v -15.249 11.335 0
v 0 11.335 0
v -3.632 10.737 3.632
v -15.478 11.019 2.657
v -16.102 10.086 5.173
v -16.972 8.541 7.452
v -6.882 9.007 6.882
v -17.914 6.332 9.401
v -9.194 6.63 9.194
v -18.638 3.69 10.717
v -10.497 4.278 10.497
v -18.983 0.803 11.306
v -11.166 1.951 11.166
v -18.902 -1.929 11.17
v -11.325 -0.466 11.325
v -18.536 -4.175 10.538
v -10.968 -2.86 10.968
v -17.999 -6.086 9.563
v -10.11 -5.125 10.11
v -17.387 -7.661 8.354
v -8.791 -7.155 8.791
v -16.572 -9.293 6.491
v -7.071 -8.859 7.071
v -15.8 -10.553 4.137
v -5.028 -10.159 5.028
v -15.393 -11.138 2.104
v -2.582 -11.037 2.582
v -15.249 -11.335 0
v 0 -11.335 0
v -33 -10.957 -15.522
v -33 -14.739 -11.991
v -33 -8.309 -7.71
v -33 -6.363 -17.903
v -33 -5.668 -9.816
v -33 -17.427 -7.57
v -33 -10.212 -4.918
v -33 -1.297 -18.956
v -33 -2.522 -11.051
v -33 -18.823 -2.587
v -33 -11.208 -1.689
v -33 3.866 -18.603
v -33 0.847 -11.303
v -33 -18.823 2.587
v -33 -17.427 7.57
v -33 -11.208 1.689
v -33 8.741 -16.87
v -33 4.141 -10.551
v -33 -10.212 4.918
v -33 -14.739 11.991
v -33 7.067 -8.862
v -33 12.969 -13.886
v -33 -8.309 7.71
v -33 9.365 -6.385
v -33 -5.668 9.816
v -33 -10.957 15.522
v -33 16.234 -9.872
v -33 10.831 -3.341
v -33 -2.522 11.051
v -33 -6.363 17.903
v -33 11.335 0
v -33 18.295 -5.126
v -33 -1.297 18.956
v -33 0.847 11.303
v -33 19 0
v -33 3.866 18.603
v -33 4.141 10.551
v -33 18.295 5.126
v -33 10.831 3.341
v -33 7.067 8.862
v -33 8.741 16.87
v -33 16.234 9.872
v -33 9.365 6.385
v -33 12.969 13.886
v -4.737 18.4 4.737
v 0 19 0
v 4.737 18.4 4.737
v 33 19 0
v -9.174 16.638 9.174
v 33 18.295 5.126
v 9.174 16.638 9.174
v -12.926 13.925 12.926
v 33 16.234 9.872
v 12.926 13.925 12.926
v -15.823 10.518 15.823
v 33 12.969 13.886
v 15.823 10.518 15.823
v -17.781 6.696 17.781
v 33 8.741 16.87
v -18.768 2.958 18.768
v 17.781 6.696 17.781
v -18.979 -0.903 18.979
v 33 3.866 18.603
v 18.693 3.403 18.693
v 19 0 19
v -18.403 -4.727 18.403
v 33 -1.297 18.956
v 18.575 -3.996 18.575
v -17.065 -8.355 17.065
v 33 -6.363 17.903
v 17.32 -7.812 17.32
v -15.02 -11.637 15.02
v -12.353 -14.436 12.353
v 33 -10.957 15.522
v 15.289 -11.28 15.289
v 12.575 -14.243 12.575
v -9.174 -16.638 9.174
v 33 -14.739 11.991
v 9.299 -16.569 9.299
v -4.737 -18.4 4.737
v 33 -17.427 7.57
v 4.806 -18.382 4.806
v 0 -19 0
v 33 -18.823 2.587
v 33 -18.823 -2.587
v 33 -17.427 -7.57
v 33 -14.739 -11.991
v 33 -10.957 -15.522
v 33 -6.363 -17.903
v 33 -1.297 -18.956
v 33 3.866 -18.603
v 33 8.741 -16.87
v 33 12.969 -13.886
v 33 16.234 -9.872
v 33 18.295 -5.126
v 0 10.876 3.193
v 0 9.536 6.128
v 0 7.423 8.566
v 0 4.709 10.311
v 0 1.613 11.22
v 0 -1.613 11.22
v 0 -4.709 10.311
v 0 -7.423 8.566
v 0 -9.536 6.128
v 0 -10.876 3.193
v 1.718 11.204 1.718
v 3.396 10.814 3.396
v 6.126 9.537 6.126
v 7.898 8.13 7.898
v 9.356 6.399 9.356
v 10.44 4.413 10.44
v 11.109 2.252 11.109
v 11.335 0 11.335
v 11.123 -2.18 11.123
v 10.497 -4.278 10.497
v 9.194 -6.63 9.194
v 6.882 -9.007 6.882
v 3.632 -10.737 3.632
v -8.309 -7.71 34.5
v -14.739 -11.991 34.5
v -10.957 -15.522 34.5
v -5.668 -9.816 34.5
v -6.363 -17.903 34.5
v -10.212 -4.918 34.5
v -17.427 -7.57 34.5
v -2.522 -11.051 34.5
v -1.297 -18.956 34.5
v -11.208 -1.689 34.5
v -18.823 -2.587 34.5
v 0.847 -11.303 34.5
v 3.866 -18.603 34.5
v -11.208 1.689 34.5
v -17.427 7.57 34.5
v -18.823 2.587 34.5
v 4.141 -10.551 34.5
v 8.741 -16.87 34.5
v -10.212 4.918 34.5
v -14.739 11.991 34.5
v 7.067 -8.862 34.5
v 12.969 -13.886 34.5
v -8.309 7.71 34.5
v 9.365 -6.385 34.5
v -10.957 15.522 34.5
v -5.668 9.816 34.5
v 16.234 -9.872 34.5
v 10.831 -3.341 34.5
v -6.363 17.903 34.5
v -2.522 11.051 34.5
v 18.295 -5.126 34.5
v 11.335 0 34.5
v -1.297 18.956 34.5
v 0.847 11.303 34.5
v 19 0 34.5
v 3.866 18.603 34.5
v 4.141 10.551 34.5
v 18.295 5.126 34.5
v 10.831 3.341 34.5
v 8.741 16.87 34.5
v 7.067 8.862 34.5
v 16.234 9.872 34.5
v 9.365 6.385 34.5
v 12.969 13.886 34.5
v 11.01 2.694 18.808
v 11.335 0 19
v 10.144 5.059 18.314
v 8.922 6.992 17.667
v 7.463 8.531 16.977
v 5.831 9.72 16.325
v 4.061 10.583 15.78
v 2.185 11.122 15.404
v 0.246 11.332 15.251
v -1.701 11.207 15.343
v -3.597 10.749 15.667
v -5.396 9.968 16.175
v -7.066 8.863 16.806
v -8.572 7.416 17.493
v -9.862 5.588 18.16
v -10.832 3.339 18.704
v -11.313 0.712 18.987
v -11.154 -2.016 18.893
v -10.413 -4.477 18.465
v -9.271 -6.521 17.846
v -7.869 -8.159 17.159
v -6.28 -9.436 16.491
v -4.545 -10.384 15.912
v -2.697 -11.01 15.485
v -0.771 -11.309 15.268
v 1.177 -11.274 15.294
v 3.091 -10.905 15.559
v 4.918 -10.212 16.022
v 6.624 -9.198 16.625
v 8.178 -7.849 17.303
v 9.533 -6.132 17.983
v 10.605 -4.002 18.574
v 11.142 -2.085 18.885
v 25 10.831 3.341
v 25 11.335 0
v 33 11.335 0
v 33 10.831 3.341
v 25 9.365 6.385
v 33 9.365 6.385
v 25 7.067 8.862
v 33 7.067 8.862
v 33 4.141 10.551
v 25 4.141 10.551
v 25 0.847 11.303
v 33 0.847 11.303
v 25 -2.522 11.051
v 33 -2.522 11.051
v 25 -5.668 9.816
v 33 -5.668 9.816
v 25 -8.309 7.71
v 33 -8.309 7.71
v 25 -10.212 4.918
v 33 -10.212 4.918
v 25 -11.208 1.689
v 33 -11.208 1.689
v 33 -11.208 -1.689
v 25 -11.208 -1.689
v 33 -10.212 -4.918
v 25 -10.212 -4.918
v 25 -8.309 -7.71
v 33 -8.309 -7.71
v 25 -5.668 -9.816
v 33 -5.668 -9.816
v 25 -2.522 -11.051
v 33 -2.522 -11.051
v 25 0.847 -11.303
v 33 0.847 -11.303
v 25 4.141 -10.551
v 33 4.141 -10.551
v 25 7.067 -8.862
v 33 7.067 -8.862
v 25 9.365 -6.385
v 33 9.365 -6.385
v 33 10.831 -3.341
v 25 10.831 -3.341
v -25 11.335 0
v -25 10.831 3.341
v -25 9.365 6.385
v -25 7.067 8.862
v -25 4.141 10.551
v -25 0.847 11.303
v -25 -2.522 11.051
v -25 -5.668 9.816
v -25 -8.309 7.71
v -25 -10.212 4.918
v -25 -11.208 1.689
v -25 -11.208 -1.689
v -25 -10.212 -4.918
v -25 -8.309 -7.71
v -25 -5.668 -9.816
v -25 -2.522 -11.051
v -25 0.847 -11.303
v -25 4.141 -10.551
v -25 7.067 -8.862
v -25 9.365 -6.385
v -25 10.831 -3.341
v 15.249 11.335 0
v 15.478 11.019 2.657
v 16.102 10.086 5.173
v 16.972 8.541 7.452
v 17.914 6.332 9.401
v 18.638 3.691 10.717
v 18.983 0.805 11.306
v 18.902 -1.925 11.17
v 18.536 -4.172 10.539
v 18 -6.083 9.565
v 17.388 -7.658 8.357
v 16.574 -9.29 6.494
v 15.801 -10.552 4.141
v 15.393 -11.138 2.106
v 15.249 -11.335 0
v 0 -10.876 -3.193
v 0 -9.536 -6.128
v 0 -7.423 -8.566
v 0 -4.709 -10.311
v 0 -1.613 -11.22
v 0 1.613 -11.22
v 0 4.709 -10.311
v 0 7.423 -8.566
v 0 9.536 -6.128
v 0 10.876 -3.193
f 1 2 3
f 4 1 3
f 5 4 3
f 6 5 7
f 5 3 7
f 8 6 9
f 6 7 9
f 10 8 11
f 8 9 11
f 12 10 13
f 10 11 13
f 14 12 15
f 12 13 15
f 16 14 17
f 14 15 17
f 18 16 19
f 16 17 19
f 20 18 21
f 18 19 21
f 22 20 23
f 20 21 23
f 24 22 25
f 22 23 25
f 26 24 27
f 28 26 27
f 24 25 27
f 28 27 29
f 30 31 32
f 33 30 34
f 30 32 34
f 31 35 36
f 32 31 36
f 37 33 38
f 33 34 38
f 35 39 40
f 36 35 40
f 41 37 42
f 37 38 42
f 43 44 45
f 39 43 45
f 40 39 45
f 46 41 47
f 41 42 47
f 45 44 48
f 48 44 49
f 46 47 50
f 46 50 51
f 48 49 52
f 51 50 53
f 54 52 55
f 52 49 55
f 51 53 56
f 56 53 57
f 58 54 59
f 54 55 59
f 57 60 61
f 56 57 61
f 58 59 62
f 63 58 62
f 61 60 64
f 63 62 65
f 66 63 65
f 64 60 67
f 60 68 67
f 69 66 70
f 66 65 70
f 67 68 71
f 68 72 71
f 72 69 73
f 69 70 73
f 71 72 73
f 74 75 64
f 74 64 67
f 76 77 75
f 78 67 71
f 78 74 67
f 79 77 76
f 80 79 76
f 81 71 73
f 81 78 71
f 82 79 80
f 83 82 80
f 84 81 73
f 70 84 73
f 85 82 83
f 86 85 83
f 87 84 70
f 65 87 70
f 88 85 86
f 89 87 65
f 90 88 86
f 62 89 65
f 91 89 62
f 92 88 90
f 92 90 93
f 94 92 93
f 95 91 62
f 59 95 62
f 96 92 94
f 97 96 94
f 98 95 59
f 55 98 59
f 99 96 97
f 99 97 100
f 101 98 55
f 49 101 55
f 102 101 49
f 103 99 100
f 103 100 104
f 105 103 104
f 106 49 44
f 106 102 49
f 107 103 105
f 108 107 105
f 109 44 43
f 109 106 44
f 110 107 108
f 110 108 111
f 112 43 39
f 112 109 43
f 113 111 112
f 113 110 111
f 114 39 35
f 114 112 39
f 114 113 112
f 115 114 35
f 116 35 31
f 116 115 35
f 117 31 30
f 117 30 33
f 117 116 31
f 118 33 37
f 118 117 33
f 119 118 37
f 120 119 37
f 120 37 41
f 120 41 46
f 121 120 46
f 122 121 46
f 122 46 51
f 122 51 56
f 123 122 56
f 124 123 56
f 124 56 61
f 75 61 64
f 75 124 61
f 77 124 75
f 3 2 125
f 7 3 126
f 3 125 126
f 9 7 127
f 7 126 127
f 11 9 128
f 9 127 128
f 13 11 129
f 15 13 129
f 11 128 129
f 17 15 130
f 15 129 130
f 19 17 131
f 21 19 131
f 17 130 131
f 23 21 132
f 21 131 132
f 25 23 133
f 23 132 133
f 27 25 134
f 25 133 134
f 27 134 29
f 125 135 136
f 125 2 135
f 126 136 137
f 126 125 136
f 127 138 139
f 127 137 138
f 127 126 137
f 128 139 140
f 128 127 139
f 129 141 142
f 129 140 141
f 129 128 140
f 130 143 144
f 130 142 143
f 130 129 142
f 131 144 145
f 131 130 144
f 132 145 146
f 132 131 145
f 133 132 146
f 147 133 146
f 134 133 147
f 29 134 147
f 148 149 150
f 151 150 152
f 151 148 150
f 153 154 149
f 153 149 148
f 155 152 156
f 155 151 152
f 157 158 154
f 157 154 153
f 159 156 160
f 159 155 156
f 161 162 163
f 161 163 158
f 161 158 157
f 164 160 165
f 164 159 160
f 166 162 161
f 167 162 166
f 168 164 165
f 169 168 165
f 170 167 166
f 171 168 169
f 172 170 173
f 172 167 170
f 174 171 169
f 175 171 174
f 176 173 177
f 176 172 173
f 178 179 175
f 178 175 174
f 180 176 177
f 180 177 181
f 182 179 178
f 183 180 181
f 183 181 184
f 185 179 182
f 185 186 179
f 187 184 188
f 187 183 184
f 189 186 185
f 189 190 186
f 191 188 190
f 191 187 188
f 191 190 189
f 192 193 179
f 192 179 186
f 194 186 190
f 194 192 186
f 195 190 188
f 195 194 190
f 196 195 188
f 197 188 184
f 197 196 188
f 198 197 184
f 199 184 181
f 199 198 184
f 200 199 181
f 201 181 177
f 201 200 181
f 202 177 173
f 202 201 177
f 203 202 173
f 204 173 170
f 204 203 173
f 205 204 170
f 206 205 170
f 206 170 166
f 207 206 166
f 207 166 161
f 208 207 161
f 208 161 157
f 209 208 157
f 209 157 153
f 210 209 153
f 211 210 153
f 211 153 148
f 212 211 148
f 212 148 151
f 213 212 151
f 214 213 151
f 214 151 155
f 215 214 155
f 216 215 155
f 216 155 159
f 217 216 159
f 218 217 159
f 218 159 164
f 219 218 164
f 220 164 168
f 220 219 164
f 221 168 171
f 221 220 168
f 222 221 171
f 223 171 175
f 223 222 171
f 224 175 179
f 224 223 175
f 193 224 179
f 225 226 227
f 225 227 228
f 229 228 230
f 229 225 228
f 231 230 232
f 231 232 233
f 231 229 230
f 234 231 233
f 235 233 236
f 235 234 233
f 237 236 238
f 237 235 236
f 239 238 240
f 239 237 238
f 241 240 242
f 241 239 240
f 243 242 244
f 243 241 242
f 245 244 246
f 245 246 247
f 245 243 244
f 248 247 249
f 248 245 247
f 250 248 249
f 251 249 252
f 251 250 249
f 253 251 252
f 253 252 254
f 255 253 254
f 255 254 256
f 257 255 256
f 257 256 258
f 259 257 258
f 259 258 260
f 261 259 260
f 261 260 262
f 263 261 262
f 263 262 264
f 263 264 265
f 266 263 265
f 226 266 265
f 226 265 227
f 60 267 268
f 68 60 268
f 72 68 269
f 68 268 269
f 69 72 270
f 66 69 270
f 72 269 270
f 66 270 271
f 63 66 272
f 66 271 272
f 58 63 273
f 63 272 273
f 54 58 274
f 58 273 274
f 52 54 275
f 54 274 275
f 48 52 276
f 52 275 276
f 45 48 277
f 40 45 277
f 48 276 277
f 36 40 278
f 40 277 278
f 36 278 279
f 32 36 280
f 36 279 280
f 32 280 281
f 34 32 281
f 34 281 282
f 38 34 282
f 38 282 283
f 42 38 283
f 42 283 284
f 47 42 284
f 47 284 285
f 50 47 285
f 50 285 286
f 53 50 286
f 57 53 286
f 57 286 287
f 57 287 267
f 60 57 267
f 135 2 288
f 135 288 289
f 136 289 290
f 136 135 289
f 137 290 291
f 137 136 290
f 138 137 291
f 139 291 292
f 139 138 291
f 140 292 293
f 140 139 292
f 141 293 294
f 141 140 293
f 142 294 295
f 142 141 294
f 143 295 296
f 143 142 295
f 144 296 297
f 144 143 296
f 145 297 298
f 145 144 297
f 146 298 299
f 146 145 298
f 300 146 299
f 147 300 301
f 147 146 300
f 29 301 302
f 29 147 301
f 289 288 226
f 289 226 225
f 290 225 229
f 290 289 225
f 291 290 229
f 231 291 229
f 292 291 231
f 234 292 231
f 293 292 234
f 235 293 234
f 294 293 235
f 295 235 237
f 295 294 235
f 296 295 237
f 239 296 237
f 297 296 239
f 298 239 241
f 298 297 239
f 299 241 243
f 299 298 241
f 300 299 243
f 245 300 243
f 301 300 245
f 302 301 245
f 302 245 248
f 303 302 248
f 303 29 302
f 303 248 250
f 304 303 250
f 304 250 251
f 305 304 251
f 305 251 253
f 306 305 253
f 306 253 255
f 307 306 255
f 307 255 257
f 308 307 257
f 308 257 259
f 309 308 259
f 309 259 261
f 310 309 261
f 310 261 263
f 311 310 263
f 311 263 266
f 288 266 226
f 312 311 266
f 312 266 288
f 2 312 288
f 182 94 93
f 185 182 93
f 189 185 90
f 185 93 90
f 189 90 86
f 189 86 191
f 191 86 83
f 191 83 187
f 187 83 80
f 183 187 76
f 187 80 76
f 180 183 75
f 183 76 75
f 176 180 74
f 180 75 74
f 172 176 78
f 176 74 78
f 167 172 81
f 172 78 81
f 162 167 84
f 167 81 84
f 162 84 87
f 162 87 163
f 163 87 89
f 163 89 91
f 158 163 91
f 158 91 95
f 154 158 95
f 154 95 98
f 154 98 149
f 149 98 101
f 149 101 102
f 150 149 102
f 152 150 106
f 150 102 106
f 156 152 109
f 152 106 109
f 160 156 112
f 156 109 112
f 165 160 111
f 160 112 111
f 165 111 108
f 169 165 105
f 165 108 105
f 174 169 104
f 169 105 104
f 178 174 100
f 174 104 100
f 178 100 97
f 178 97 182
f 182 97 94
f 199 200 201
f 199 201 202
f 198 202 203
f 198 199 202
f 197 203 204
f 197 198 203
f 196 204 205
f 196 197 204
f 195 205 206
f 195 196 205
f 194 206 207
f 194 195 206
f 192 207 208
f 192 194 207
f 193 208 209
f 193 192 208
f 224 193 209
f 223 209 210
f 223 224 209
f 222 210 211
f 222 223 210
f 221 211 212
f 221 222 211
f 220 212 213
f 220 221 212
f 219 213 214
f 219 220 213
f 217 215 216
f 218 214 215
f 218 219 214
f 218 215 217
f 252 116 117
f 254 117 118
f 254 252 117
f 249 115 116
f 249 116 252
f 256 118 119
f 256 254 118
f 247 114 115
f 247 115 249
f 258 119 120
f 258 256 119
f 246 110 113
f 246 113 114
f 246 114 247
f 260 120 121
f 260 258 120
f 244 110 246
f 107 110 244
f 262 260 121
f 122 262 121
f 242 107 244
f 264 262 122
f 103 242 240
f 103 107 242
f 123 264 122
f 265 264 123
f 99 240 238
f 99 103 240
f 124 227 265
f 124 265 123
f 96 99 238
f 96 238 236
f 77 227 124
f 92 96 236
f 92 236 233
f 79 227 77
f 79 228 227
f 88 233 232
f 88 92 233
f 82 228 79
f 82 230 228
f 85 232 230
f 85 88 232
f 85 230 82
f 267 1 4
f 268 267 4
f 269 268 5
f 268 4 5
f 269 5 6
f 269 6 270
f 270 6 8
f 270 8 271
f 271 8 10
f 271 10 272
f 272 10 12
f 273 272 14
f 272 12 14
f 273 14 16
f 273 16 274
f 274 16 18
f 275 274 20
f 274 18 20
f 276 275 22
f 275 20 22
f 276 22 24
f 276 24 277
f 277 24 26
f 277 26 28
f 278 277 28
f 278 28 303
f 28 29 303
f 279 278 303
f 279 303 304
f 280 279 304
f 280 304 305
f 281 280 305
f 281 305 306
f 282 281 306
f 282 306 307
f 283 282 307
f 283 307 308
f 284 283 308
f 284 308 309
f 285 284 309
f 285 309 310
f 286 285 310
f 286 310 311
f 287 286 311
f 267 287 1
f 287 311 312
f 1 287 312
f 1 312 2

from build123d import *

# Parameters (mm, degrees)
F0_R          = 19
F0_R_2        = 11.335
F1_DEPTH      = 33
F1_DEPTH_BACK = 33
F2_R          = 19
F2_R_2        = 11.335
F3_DEPTH      = 34.5
F4_DEPTH      = 25
F4_DEPTH_BACK = 25


with BuildPart() as f1:
    # F0 (on Right) → F1 (new body, two sides)
    with BuildSketch(Plane.YZ) as f1_sk:
        Circle(F0_R)
        Circle(F0_R_2, mode=Mode.SUBTRACT)
    extrude(amount=F1_DEPTH)
    extrude(f1_sk.sketch, amount=-F1_DEPTH_BACK)

    # F2 (on Top) → F3 (join)
    with BuildSketch(Plane.XY):
        Circle(F2_R)
        Circle(F2_R_2, mode=Mode.SUBTRACT)
    extrude(amount=F3_DEPTH)

    # F0 (on Right) → F4 (cut, two sides)
    with BuildSketch(Plane.YZ) as f4_sk:
        Circle(F0_R_2)
    extrude(amount=-F4_DEPTH, mode=Mode.SUBTRACT)
    extrude(f4_sk.sketch, amount=F4_DEPTH_BACK, mode=Mode.SUBTRACT)


solid = f1.part
